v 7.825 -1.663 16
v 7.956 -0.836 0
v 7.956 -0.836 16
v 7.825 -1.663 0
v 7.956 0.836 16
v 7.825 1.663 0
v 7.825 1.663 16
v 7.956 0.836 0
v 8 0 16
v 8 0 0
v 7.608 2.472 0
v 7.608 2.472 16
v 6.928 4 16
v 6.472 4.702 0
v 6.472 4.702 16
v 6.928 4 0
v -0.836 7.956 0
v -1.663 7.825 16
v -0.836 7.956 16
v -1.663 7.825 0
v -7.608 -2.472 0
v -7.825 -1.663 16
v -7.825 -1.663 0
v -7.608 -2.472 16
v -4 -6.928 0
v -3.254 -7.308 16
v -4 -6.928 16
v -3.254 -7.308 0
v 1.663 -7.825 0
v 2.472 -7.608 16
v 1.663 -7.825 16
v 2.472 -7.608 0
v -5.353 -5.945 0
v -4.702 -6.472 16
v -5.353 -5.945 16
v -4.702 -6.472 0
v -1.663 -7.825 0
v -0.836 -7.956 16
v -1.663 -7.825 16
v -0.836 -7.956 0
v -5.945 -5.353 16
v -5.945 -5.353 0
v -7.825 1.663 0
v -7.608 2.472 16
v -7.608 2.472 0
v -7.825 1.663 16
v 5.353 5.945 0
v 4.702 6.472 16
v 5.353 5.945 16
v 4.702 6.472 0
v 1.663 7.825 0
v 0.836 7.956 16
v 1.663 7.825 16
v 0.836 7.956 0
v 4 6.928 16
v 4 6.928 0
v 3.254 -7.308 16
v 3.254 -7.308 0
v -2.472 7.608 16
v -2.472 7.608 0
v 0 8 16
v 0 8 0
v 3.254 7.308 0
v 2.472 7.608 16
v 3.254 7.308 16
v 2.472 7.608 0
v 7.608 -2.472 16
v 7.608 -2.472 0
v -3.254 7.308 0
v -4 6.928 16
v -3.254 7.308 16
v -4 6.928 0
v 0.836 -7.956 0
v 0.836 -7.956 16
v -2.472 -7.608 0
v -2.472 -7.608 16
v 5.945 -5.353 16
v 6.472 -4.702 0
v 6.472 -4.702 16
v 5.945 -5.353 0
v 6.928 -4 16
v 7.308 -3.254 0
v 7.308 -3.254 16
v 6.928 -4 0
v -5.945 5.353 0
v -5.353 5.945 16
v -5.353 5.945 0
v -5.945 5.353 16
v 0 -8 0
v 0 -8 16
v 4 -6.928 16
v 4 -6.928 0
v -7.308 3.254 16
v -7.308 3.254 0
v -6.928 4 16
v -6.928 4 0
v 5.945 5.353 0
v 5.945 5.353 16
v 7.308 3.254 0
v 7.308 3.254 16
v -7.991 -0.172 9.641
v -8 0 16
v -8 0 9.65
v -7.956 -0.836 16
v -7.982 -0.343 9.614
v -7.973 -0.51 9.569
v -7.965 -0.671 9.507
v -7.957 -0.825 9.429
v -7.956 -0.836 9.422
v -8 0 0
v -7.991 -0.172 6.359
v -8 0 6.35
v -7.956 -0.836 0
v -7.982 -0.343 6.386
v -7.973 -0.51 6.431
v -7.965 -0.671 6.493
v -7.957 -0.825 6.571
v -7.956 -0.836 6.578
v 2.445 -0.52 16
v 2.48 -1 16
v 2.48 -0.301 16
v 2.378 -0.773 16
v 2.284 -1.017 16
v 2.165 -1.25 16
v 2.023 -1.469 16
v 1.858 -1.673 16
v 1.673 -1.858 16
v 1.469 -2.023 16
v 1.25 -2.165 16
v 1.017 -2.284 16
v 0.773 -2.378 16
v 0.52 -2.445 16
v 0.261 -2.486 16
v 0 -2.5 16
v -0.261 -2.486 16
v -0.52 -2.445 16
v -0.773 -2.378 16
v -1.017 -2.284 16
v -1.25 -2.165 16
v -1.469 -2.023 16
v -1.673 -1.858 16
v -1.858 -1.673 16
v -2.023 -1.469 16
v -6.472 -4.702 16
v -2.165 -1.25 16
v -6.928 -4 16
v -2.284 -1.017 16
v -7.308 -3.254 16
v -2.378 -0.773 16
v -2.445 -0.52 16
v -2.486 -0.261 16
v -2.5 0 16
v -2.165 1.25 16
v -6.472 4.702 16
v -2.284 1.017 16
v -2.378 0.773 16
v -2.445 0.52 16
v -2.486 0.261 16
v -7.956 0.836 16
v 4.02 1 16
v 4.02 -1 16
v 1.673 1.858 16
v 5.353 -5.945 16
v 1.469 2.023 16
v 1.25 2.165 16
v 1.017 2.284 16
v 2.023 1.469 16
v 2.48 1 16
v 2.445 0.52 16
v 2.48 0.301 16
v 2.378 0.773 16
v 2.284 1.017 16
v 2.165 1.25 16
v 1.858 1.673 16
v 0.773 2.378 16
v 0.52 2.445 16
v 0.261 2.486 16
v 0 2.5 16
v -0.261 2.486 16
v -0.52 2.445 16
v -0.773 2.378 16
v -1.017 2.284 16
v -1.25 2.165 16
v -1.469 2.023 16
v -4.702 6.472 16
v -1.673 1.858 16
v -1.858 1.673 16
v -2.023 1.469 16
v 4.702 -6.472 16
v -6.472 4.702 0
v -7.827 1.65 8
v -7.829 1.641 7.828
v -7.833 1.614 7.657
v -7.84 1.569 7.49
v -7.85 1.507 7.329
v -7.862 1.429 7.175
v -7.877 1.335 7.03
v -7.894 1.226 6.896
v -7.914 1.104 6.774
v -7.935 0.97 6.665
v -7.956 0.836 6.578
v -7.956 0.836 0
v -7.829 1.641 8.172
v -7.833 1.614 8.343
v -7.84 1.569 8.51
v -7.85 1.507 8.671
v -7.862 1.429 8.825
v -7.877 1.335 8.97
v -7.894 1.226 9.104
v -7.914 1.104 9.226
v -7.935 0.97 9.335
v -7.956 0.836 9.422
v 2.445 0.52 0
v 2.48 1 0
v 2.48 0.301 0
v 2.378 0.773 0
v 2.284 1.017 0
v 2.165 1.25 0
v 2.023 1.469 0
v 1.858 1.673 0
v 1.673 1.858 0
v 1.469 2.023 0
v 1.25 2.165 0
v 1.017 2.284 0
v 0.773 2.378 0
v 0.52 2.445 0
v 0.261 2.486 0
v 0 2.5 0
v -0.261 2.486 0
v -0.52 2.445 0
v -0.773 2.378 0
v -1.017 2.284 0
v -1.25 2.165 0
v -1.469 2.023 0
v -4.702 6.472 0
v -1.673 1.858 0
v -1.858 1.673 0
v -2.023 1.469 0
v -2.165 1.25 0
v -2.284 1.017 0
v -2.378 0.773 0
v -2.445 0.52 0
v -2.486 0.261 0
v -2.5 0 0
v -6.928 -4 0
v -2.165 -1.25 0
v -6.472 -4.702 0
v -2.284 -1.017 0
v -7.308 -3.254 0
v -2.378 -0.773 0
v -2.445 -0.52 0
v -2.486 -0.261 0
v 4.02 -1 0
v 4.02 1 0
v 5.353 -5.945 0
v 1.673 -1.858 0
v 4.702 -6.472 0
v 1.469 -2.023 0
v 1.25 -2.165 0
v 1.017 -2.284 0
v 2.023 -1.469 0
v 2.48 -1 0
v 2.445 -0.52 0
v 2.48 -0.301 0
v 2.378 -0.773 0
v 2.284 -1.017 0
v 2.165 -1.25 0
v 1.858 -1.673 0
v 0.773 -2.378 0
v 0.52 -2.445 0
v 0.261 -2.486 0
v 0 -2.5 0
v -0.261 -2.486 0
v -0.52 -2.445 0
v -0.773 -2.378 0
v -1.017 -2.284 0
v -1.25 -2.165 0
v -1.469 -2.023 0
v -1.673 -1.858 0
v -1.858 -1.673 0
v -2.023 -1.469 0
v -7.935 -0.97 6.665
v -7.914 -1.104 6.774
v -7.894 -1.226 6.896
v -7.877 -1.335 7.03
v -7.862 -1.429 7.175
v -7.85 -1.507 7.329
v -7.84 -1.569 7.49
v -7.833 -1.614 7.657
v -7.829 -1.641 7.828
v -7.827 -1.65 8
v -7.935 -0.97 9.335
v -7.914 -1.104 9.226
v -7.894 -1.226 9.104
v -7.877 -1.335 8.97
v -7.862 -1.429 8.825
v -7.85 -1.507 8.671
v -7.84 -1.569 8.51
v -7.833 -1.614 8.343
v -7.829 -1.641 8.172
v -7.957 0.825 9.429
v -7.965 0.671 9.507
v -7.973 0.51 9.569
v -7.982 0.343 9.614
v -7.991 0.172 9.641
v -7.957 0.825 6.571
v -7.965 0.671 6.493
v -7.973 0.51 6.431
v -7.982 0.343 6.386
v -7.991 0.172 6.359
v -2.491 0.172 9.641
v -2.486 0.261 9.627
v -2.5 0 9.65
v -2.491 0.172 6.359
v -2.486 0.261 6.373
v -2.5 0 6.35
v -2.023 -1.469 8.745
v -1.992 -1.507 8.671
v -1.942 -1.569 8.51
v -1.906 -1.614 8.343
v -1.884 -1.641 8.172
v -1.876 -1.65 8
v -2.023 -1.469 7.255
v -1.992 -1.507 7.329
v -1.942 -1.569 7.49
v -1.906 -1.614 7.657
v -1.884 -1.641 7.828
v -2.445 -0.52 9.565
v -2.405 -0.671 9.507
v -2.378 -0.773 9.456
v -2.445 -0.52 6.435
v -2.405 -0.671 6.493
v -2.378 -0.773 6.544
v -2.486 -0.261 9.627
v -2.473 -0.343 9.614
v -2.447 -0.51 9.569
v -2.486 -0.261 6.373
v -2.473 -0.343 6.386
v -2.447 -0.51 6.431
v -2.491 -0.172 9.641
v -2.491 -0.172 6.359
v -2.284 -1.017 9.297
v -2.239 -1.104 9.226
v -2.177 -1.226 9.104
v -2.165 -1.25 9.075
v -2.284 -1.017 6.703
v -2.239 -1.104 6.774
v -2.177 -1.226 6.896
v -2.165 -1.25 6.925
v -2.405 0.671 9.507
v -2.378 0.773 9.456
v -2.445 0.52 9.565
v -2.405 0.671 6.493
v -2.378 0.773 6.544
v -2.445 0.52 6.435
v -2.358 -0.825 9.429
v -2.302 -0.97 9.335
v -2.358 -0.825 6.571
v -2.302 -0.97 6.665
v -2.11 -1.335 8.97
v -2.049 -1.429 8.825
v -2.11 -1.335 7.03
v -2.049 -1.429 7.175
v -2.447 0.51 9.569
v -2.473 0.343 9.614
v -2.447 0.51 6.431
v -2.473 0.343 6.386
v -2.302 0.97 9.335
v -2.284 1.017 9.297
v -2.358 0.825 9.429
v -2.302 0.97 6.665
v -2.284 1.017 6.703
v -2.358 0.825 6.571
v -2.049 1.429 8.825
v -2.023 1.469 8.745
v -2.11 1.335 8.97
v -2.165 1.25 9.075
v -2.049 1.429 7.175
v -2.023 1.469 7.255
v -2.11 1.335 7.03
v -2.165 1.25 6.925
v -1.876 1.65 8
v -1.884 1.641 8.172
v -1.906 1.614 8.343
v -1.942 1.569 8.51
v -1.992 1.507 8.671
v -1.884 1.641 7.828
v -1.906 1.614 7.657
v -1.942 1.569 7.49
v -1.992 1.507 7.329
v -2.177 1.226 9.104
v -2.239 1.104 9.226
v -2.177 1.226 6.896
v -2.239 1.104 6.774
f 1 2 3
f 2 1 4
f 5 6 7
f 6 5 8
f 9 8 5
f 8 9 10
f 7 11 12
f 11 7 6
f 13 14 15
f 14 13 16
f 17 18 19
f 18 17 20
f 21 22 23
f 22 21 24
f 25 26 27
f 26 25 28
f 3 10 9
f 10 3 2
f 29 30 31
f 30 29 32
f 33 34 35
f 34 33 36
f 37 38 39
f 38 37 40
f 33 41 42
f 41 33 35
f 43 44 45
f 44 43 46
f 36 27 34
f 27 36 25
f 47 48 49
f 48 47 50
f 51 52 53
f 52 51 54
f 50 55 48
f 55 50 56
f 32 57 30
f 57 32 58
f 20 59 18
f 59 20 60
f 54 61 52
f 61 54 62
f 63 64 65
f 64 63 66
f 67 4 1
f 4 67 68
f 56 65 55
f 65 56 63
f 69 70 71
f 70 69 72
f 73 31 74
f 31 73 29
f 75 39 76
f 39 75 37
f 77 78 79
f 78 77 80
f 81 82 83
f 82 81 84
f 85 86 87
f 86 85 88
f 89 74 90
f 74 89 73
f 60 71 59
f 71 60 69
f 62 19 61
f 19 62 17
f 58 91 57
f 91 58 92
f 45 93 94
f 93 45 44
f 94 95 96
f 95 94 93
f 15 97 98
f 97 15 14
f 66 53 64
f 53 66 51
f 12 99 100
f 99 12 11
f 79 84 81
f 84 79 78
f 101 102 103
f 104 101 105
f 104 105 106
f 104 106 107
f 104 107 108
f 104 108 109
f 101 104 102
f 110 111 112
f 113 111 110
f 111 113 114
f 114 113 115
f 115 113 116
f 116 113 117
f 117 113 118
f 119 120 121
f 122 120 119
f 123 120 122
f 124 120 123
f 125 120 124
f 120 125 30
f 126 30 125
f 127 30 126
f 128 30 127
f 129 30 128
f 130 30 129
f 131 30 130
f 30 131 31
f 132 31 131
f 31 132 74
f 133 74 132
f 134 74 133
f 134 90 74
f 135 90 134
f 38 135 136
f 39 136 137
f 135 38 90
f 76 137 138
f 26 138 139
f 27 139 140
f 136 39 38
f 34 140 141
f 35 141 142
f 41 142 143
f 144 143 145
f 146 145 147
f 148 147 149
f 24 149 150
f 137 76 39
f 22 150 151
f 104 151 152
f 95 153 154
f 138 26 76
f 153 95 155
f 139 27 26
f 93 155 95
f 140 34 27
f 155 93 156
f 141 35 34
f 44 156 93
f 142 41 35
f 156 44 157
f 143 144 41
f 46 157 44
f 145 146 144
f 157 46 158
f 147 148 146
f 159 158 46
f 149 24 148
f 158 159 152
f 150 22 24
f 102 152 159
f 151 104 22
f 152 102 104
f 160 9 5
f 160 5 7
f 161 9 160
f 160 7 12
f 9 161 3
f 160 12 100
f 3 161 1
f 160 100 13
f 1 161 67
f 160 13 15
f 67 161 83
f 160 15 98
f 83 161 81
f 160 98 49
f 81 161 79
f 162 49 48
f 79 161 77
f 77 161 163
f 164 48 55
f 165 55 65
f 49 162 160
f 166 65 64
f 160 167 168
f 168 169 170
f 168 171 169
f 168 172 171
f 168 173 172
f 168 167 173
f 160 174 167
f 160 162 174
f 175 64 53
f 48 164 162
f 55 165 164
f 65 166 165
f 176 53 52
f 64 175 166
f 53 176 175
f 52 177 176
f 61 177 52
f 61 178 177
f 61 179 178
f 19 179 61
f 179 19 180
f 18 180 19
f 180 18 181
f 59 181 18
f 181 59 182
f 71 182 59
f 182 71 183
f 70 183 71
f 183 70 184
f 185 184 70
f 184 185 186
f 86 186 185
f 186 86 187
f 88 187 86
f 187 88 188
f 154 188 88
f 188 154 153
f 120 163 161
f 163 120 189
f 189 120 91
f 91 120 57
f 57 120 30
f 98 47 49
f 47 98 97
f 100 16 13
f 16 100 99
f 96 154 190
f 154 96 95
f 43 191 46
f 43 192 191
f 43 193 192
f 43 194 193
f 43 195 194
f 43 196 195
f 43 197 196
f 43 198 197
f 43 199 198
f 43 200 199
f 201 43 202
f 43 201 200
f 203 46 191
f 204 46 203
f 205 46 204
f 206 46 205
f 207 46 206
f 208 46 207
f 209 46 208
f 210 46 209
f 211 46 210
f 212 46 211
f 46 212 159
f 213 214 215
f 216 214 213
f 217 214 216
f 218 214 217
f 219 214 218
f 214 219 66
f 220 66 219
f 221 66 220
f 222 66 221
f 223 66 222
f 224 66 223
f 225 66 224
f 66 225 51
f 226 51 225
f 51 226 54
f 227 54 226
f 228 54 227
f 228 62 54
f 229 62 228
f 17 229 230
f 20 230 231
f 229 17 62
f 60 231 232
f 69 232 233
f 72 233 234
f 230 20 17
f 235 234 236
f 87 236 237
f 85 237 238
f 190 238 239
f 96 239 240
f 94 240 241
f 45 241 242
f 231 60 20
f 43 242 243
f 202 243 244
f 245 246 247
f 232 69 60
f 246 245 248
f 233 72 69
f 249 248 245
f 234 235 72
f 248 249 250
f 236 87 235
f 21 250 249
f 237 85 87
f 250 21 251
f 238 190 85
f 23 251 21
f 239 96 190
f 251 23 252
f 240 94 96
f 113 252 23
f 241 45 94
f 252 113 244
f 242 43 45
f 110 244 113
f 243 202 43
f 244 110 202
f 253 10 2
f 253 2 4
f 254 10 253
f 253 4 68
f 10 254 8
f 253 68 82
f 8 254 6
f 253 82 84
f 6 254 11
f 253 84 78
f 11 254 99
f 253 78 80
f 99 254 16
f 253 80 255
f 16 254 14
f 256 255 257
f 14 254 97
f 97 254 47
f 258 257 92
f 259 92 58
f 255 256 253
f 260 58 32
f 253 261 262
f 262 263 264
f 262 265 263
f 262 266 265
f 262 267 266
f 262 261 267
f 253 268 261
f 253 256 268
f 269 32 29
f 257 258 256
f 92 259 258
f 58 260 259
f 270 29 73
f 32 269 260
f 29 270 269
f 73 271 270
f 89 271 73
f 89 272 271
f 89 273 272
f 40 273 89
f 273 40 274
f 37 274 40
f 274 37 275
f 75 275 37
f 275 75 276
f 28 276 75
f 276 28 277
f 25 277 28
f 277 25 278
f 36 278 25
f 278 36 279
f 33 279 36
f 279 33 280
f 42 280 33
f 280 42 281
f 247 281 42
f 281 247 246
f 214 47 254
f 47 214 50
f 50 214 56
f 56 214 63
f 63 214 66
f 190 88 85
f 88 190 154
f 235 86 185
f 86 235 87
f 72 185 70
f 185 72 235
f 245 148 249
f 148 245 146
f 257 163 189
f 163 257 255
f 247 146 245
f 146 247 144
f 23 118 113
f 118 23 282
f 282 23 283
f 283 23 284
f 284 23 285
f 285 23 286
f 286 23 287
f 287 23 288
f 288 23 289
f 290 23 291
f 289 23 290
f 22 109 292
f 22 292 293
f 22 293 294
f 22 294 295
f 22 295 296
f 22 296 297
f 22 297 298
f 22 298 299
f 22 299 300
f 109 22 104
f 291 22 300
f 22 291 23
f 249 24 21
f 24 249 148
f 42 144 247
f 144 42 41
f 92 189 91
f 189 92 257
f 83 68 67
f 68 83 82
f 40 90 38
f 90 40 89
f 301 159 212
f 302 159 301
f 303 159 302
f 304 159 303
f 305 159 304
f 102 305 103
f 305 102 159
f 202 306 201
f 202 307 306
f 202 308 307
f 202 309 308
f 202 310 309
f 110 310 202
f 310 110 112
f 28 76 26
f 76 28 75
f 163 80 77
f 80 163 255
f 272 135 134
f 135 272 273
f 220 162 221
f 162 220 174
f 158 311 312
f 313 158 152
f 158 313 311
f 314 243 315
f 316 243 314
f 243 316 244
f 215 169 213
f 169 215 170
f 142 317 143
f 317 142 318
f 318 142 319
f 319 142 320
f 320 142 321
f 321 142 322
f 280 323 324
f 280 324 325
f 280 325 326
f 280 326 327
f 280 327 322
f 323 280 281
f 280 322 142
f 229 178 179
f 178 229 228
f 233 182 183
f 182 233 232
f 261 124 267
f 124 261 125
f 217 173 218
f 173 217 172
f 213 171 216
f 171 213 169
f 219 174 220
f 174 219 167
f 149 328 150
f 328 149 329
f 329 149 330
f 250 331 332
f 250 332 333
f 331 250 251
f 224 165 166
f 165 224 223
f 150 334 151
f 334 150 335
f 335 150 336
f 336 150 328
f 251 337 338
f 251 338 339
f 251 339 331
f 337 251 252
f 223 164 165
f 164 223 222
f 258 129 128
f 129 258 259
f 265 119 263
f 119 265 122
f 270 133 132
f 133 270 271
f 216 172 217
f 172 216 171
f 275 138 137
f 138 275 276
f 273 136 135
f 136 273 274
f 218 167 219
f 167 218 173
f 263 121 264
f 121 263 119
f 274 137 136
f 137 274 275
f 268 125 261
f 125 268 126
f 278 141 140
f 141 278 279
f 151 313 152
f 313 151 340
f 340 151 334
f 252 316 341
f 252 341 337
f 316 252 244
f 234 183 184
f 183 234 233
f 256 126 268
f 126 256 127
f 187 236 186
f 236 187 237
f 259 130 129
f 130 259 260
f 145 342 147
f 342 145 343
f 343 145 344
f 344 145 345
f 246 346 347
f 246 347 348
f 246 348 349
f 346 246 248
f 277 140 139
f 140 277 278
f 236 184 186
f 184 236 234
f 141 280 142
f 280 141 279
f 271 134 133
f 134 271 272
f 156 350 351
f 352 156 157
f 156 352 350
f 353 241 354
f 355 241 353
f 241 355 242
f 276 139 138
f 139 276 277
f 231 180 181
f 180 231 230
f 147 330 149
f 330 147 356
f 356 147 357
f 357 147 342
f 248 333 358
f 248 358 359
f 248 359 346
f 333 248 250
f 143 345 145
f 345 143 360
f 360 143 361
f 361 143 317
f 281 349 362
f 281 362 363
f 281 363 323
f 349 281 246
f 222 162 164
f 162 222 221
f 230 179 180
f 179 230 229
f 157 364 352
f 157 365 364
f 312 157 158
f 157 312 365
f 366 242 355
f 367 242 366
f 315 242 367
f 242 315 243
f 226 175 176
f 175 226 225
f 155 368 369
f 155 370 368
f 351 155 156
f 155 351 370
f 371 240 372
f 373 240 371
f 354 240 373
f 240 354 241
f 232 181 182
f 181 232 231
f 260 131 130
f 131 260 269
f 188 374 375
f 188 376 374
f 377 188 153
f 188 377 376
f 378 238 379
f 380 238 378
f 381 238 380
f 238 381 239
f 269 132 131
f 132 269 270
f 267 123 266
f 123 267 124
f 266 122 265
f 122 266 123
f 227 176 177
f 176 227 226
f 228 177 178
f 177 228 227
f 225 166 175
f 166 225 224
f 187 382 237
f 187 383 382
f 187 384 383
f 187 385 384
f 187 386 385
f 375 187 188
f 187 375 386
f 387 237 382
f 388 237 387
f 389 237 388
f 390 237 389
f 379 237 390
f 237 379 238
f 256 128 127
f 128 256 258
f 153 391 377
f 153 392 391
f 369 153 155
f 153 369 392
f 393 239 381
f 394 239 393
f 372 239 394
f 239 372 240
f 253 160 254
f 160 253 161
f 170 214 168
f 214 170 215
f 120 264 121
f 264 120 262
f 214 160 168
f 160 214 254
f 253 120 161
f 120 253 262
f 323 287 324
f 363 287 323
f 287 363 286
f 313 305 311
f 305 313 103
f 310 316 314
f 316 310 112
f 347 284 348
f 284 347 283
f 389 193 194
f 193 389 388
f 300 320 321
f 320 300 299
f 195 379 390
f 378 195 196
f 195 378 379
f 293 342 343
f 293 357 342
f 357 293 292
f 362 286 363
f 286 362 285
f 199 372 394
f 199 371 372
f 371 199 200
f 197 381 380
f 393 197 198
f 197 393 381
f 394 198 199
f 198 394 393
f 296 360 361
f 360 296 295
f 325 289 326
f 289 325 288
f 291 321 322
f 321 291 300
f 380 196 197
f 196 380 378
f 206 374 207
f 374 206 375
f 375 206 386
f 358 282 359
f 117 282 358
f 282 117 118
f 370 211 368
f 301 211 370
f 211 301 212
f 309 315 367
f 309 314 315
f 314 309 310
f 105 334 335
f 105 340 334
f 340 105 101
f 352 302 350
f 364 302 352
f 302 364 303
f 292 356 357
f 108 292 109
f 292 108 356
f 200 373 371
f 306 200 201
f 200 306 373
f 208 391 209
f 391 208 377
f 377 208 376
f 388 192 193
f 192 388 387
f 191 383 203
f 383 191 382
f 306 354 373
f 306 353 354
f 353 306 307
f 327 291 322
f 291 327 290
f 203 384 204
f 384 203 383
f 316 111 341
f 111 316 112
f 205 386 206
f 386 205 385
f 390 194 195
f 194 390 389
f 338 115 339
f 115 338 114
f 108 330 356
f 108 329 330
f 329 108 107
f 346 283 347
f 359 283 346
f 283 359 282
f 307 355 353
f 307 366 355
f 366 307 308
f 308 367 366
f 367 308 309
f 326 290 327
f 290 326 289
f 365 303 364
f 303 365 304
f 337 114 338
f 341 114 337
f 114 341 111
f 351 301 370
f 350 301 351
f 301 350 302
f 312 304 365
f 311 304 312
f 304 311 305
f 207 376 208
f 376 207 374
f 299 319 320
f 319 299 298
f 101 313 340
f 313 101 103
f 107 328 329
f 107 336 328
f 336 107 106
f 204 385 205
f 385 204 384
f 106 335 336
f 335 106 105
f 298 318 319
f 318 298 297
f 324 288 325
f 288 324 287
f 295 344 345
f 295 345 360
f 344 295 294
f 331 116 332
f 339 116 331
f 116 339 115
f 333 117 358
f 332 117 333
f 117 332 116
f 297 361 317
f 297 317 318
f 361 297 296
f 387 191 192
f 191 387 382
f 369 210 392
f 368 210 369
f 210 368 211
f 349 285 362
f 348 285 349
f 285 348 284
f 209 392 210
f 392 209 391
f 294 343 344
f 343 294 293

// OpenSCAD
// Keyway hub for a 5 mm shaft.
$fn = 60;
eps = 0.02;
shaft_d = 5;
outer_d = 16;
length = 16;
key_w = 2;
key_depth = 1.5;
difference() {
    cylinder(d = outer_d, h = length);
    translate([0, 0, -eps]) cylinder(d = shaft_d, h = length + 2 * eps);
    translate([shaft_d / 2 - eps, -key_w / 2, -eps]) cube([key_depth + 2 * eps, key_w, length + 2 * eps]);
    translate([-outer_d / 2 - eps, 0, length / 2]) rotate([0, 90, 0]) cylinder(d = 3.3, h = outer_d / 2 + 2 * eps);
}
